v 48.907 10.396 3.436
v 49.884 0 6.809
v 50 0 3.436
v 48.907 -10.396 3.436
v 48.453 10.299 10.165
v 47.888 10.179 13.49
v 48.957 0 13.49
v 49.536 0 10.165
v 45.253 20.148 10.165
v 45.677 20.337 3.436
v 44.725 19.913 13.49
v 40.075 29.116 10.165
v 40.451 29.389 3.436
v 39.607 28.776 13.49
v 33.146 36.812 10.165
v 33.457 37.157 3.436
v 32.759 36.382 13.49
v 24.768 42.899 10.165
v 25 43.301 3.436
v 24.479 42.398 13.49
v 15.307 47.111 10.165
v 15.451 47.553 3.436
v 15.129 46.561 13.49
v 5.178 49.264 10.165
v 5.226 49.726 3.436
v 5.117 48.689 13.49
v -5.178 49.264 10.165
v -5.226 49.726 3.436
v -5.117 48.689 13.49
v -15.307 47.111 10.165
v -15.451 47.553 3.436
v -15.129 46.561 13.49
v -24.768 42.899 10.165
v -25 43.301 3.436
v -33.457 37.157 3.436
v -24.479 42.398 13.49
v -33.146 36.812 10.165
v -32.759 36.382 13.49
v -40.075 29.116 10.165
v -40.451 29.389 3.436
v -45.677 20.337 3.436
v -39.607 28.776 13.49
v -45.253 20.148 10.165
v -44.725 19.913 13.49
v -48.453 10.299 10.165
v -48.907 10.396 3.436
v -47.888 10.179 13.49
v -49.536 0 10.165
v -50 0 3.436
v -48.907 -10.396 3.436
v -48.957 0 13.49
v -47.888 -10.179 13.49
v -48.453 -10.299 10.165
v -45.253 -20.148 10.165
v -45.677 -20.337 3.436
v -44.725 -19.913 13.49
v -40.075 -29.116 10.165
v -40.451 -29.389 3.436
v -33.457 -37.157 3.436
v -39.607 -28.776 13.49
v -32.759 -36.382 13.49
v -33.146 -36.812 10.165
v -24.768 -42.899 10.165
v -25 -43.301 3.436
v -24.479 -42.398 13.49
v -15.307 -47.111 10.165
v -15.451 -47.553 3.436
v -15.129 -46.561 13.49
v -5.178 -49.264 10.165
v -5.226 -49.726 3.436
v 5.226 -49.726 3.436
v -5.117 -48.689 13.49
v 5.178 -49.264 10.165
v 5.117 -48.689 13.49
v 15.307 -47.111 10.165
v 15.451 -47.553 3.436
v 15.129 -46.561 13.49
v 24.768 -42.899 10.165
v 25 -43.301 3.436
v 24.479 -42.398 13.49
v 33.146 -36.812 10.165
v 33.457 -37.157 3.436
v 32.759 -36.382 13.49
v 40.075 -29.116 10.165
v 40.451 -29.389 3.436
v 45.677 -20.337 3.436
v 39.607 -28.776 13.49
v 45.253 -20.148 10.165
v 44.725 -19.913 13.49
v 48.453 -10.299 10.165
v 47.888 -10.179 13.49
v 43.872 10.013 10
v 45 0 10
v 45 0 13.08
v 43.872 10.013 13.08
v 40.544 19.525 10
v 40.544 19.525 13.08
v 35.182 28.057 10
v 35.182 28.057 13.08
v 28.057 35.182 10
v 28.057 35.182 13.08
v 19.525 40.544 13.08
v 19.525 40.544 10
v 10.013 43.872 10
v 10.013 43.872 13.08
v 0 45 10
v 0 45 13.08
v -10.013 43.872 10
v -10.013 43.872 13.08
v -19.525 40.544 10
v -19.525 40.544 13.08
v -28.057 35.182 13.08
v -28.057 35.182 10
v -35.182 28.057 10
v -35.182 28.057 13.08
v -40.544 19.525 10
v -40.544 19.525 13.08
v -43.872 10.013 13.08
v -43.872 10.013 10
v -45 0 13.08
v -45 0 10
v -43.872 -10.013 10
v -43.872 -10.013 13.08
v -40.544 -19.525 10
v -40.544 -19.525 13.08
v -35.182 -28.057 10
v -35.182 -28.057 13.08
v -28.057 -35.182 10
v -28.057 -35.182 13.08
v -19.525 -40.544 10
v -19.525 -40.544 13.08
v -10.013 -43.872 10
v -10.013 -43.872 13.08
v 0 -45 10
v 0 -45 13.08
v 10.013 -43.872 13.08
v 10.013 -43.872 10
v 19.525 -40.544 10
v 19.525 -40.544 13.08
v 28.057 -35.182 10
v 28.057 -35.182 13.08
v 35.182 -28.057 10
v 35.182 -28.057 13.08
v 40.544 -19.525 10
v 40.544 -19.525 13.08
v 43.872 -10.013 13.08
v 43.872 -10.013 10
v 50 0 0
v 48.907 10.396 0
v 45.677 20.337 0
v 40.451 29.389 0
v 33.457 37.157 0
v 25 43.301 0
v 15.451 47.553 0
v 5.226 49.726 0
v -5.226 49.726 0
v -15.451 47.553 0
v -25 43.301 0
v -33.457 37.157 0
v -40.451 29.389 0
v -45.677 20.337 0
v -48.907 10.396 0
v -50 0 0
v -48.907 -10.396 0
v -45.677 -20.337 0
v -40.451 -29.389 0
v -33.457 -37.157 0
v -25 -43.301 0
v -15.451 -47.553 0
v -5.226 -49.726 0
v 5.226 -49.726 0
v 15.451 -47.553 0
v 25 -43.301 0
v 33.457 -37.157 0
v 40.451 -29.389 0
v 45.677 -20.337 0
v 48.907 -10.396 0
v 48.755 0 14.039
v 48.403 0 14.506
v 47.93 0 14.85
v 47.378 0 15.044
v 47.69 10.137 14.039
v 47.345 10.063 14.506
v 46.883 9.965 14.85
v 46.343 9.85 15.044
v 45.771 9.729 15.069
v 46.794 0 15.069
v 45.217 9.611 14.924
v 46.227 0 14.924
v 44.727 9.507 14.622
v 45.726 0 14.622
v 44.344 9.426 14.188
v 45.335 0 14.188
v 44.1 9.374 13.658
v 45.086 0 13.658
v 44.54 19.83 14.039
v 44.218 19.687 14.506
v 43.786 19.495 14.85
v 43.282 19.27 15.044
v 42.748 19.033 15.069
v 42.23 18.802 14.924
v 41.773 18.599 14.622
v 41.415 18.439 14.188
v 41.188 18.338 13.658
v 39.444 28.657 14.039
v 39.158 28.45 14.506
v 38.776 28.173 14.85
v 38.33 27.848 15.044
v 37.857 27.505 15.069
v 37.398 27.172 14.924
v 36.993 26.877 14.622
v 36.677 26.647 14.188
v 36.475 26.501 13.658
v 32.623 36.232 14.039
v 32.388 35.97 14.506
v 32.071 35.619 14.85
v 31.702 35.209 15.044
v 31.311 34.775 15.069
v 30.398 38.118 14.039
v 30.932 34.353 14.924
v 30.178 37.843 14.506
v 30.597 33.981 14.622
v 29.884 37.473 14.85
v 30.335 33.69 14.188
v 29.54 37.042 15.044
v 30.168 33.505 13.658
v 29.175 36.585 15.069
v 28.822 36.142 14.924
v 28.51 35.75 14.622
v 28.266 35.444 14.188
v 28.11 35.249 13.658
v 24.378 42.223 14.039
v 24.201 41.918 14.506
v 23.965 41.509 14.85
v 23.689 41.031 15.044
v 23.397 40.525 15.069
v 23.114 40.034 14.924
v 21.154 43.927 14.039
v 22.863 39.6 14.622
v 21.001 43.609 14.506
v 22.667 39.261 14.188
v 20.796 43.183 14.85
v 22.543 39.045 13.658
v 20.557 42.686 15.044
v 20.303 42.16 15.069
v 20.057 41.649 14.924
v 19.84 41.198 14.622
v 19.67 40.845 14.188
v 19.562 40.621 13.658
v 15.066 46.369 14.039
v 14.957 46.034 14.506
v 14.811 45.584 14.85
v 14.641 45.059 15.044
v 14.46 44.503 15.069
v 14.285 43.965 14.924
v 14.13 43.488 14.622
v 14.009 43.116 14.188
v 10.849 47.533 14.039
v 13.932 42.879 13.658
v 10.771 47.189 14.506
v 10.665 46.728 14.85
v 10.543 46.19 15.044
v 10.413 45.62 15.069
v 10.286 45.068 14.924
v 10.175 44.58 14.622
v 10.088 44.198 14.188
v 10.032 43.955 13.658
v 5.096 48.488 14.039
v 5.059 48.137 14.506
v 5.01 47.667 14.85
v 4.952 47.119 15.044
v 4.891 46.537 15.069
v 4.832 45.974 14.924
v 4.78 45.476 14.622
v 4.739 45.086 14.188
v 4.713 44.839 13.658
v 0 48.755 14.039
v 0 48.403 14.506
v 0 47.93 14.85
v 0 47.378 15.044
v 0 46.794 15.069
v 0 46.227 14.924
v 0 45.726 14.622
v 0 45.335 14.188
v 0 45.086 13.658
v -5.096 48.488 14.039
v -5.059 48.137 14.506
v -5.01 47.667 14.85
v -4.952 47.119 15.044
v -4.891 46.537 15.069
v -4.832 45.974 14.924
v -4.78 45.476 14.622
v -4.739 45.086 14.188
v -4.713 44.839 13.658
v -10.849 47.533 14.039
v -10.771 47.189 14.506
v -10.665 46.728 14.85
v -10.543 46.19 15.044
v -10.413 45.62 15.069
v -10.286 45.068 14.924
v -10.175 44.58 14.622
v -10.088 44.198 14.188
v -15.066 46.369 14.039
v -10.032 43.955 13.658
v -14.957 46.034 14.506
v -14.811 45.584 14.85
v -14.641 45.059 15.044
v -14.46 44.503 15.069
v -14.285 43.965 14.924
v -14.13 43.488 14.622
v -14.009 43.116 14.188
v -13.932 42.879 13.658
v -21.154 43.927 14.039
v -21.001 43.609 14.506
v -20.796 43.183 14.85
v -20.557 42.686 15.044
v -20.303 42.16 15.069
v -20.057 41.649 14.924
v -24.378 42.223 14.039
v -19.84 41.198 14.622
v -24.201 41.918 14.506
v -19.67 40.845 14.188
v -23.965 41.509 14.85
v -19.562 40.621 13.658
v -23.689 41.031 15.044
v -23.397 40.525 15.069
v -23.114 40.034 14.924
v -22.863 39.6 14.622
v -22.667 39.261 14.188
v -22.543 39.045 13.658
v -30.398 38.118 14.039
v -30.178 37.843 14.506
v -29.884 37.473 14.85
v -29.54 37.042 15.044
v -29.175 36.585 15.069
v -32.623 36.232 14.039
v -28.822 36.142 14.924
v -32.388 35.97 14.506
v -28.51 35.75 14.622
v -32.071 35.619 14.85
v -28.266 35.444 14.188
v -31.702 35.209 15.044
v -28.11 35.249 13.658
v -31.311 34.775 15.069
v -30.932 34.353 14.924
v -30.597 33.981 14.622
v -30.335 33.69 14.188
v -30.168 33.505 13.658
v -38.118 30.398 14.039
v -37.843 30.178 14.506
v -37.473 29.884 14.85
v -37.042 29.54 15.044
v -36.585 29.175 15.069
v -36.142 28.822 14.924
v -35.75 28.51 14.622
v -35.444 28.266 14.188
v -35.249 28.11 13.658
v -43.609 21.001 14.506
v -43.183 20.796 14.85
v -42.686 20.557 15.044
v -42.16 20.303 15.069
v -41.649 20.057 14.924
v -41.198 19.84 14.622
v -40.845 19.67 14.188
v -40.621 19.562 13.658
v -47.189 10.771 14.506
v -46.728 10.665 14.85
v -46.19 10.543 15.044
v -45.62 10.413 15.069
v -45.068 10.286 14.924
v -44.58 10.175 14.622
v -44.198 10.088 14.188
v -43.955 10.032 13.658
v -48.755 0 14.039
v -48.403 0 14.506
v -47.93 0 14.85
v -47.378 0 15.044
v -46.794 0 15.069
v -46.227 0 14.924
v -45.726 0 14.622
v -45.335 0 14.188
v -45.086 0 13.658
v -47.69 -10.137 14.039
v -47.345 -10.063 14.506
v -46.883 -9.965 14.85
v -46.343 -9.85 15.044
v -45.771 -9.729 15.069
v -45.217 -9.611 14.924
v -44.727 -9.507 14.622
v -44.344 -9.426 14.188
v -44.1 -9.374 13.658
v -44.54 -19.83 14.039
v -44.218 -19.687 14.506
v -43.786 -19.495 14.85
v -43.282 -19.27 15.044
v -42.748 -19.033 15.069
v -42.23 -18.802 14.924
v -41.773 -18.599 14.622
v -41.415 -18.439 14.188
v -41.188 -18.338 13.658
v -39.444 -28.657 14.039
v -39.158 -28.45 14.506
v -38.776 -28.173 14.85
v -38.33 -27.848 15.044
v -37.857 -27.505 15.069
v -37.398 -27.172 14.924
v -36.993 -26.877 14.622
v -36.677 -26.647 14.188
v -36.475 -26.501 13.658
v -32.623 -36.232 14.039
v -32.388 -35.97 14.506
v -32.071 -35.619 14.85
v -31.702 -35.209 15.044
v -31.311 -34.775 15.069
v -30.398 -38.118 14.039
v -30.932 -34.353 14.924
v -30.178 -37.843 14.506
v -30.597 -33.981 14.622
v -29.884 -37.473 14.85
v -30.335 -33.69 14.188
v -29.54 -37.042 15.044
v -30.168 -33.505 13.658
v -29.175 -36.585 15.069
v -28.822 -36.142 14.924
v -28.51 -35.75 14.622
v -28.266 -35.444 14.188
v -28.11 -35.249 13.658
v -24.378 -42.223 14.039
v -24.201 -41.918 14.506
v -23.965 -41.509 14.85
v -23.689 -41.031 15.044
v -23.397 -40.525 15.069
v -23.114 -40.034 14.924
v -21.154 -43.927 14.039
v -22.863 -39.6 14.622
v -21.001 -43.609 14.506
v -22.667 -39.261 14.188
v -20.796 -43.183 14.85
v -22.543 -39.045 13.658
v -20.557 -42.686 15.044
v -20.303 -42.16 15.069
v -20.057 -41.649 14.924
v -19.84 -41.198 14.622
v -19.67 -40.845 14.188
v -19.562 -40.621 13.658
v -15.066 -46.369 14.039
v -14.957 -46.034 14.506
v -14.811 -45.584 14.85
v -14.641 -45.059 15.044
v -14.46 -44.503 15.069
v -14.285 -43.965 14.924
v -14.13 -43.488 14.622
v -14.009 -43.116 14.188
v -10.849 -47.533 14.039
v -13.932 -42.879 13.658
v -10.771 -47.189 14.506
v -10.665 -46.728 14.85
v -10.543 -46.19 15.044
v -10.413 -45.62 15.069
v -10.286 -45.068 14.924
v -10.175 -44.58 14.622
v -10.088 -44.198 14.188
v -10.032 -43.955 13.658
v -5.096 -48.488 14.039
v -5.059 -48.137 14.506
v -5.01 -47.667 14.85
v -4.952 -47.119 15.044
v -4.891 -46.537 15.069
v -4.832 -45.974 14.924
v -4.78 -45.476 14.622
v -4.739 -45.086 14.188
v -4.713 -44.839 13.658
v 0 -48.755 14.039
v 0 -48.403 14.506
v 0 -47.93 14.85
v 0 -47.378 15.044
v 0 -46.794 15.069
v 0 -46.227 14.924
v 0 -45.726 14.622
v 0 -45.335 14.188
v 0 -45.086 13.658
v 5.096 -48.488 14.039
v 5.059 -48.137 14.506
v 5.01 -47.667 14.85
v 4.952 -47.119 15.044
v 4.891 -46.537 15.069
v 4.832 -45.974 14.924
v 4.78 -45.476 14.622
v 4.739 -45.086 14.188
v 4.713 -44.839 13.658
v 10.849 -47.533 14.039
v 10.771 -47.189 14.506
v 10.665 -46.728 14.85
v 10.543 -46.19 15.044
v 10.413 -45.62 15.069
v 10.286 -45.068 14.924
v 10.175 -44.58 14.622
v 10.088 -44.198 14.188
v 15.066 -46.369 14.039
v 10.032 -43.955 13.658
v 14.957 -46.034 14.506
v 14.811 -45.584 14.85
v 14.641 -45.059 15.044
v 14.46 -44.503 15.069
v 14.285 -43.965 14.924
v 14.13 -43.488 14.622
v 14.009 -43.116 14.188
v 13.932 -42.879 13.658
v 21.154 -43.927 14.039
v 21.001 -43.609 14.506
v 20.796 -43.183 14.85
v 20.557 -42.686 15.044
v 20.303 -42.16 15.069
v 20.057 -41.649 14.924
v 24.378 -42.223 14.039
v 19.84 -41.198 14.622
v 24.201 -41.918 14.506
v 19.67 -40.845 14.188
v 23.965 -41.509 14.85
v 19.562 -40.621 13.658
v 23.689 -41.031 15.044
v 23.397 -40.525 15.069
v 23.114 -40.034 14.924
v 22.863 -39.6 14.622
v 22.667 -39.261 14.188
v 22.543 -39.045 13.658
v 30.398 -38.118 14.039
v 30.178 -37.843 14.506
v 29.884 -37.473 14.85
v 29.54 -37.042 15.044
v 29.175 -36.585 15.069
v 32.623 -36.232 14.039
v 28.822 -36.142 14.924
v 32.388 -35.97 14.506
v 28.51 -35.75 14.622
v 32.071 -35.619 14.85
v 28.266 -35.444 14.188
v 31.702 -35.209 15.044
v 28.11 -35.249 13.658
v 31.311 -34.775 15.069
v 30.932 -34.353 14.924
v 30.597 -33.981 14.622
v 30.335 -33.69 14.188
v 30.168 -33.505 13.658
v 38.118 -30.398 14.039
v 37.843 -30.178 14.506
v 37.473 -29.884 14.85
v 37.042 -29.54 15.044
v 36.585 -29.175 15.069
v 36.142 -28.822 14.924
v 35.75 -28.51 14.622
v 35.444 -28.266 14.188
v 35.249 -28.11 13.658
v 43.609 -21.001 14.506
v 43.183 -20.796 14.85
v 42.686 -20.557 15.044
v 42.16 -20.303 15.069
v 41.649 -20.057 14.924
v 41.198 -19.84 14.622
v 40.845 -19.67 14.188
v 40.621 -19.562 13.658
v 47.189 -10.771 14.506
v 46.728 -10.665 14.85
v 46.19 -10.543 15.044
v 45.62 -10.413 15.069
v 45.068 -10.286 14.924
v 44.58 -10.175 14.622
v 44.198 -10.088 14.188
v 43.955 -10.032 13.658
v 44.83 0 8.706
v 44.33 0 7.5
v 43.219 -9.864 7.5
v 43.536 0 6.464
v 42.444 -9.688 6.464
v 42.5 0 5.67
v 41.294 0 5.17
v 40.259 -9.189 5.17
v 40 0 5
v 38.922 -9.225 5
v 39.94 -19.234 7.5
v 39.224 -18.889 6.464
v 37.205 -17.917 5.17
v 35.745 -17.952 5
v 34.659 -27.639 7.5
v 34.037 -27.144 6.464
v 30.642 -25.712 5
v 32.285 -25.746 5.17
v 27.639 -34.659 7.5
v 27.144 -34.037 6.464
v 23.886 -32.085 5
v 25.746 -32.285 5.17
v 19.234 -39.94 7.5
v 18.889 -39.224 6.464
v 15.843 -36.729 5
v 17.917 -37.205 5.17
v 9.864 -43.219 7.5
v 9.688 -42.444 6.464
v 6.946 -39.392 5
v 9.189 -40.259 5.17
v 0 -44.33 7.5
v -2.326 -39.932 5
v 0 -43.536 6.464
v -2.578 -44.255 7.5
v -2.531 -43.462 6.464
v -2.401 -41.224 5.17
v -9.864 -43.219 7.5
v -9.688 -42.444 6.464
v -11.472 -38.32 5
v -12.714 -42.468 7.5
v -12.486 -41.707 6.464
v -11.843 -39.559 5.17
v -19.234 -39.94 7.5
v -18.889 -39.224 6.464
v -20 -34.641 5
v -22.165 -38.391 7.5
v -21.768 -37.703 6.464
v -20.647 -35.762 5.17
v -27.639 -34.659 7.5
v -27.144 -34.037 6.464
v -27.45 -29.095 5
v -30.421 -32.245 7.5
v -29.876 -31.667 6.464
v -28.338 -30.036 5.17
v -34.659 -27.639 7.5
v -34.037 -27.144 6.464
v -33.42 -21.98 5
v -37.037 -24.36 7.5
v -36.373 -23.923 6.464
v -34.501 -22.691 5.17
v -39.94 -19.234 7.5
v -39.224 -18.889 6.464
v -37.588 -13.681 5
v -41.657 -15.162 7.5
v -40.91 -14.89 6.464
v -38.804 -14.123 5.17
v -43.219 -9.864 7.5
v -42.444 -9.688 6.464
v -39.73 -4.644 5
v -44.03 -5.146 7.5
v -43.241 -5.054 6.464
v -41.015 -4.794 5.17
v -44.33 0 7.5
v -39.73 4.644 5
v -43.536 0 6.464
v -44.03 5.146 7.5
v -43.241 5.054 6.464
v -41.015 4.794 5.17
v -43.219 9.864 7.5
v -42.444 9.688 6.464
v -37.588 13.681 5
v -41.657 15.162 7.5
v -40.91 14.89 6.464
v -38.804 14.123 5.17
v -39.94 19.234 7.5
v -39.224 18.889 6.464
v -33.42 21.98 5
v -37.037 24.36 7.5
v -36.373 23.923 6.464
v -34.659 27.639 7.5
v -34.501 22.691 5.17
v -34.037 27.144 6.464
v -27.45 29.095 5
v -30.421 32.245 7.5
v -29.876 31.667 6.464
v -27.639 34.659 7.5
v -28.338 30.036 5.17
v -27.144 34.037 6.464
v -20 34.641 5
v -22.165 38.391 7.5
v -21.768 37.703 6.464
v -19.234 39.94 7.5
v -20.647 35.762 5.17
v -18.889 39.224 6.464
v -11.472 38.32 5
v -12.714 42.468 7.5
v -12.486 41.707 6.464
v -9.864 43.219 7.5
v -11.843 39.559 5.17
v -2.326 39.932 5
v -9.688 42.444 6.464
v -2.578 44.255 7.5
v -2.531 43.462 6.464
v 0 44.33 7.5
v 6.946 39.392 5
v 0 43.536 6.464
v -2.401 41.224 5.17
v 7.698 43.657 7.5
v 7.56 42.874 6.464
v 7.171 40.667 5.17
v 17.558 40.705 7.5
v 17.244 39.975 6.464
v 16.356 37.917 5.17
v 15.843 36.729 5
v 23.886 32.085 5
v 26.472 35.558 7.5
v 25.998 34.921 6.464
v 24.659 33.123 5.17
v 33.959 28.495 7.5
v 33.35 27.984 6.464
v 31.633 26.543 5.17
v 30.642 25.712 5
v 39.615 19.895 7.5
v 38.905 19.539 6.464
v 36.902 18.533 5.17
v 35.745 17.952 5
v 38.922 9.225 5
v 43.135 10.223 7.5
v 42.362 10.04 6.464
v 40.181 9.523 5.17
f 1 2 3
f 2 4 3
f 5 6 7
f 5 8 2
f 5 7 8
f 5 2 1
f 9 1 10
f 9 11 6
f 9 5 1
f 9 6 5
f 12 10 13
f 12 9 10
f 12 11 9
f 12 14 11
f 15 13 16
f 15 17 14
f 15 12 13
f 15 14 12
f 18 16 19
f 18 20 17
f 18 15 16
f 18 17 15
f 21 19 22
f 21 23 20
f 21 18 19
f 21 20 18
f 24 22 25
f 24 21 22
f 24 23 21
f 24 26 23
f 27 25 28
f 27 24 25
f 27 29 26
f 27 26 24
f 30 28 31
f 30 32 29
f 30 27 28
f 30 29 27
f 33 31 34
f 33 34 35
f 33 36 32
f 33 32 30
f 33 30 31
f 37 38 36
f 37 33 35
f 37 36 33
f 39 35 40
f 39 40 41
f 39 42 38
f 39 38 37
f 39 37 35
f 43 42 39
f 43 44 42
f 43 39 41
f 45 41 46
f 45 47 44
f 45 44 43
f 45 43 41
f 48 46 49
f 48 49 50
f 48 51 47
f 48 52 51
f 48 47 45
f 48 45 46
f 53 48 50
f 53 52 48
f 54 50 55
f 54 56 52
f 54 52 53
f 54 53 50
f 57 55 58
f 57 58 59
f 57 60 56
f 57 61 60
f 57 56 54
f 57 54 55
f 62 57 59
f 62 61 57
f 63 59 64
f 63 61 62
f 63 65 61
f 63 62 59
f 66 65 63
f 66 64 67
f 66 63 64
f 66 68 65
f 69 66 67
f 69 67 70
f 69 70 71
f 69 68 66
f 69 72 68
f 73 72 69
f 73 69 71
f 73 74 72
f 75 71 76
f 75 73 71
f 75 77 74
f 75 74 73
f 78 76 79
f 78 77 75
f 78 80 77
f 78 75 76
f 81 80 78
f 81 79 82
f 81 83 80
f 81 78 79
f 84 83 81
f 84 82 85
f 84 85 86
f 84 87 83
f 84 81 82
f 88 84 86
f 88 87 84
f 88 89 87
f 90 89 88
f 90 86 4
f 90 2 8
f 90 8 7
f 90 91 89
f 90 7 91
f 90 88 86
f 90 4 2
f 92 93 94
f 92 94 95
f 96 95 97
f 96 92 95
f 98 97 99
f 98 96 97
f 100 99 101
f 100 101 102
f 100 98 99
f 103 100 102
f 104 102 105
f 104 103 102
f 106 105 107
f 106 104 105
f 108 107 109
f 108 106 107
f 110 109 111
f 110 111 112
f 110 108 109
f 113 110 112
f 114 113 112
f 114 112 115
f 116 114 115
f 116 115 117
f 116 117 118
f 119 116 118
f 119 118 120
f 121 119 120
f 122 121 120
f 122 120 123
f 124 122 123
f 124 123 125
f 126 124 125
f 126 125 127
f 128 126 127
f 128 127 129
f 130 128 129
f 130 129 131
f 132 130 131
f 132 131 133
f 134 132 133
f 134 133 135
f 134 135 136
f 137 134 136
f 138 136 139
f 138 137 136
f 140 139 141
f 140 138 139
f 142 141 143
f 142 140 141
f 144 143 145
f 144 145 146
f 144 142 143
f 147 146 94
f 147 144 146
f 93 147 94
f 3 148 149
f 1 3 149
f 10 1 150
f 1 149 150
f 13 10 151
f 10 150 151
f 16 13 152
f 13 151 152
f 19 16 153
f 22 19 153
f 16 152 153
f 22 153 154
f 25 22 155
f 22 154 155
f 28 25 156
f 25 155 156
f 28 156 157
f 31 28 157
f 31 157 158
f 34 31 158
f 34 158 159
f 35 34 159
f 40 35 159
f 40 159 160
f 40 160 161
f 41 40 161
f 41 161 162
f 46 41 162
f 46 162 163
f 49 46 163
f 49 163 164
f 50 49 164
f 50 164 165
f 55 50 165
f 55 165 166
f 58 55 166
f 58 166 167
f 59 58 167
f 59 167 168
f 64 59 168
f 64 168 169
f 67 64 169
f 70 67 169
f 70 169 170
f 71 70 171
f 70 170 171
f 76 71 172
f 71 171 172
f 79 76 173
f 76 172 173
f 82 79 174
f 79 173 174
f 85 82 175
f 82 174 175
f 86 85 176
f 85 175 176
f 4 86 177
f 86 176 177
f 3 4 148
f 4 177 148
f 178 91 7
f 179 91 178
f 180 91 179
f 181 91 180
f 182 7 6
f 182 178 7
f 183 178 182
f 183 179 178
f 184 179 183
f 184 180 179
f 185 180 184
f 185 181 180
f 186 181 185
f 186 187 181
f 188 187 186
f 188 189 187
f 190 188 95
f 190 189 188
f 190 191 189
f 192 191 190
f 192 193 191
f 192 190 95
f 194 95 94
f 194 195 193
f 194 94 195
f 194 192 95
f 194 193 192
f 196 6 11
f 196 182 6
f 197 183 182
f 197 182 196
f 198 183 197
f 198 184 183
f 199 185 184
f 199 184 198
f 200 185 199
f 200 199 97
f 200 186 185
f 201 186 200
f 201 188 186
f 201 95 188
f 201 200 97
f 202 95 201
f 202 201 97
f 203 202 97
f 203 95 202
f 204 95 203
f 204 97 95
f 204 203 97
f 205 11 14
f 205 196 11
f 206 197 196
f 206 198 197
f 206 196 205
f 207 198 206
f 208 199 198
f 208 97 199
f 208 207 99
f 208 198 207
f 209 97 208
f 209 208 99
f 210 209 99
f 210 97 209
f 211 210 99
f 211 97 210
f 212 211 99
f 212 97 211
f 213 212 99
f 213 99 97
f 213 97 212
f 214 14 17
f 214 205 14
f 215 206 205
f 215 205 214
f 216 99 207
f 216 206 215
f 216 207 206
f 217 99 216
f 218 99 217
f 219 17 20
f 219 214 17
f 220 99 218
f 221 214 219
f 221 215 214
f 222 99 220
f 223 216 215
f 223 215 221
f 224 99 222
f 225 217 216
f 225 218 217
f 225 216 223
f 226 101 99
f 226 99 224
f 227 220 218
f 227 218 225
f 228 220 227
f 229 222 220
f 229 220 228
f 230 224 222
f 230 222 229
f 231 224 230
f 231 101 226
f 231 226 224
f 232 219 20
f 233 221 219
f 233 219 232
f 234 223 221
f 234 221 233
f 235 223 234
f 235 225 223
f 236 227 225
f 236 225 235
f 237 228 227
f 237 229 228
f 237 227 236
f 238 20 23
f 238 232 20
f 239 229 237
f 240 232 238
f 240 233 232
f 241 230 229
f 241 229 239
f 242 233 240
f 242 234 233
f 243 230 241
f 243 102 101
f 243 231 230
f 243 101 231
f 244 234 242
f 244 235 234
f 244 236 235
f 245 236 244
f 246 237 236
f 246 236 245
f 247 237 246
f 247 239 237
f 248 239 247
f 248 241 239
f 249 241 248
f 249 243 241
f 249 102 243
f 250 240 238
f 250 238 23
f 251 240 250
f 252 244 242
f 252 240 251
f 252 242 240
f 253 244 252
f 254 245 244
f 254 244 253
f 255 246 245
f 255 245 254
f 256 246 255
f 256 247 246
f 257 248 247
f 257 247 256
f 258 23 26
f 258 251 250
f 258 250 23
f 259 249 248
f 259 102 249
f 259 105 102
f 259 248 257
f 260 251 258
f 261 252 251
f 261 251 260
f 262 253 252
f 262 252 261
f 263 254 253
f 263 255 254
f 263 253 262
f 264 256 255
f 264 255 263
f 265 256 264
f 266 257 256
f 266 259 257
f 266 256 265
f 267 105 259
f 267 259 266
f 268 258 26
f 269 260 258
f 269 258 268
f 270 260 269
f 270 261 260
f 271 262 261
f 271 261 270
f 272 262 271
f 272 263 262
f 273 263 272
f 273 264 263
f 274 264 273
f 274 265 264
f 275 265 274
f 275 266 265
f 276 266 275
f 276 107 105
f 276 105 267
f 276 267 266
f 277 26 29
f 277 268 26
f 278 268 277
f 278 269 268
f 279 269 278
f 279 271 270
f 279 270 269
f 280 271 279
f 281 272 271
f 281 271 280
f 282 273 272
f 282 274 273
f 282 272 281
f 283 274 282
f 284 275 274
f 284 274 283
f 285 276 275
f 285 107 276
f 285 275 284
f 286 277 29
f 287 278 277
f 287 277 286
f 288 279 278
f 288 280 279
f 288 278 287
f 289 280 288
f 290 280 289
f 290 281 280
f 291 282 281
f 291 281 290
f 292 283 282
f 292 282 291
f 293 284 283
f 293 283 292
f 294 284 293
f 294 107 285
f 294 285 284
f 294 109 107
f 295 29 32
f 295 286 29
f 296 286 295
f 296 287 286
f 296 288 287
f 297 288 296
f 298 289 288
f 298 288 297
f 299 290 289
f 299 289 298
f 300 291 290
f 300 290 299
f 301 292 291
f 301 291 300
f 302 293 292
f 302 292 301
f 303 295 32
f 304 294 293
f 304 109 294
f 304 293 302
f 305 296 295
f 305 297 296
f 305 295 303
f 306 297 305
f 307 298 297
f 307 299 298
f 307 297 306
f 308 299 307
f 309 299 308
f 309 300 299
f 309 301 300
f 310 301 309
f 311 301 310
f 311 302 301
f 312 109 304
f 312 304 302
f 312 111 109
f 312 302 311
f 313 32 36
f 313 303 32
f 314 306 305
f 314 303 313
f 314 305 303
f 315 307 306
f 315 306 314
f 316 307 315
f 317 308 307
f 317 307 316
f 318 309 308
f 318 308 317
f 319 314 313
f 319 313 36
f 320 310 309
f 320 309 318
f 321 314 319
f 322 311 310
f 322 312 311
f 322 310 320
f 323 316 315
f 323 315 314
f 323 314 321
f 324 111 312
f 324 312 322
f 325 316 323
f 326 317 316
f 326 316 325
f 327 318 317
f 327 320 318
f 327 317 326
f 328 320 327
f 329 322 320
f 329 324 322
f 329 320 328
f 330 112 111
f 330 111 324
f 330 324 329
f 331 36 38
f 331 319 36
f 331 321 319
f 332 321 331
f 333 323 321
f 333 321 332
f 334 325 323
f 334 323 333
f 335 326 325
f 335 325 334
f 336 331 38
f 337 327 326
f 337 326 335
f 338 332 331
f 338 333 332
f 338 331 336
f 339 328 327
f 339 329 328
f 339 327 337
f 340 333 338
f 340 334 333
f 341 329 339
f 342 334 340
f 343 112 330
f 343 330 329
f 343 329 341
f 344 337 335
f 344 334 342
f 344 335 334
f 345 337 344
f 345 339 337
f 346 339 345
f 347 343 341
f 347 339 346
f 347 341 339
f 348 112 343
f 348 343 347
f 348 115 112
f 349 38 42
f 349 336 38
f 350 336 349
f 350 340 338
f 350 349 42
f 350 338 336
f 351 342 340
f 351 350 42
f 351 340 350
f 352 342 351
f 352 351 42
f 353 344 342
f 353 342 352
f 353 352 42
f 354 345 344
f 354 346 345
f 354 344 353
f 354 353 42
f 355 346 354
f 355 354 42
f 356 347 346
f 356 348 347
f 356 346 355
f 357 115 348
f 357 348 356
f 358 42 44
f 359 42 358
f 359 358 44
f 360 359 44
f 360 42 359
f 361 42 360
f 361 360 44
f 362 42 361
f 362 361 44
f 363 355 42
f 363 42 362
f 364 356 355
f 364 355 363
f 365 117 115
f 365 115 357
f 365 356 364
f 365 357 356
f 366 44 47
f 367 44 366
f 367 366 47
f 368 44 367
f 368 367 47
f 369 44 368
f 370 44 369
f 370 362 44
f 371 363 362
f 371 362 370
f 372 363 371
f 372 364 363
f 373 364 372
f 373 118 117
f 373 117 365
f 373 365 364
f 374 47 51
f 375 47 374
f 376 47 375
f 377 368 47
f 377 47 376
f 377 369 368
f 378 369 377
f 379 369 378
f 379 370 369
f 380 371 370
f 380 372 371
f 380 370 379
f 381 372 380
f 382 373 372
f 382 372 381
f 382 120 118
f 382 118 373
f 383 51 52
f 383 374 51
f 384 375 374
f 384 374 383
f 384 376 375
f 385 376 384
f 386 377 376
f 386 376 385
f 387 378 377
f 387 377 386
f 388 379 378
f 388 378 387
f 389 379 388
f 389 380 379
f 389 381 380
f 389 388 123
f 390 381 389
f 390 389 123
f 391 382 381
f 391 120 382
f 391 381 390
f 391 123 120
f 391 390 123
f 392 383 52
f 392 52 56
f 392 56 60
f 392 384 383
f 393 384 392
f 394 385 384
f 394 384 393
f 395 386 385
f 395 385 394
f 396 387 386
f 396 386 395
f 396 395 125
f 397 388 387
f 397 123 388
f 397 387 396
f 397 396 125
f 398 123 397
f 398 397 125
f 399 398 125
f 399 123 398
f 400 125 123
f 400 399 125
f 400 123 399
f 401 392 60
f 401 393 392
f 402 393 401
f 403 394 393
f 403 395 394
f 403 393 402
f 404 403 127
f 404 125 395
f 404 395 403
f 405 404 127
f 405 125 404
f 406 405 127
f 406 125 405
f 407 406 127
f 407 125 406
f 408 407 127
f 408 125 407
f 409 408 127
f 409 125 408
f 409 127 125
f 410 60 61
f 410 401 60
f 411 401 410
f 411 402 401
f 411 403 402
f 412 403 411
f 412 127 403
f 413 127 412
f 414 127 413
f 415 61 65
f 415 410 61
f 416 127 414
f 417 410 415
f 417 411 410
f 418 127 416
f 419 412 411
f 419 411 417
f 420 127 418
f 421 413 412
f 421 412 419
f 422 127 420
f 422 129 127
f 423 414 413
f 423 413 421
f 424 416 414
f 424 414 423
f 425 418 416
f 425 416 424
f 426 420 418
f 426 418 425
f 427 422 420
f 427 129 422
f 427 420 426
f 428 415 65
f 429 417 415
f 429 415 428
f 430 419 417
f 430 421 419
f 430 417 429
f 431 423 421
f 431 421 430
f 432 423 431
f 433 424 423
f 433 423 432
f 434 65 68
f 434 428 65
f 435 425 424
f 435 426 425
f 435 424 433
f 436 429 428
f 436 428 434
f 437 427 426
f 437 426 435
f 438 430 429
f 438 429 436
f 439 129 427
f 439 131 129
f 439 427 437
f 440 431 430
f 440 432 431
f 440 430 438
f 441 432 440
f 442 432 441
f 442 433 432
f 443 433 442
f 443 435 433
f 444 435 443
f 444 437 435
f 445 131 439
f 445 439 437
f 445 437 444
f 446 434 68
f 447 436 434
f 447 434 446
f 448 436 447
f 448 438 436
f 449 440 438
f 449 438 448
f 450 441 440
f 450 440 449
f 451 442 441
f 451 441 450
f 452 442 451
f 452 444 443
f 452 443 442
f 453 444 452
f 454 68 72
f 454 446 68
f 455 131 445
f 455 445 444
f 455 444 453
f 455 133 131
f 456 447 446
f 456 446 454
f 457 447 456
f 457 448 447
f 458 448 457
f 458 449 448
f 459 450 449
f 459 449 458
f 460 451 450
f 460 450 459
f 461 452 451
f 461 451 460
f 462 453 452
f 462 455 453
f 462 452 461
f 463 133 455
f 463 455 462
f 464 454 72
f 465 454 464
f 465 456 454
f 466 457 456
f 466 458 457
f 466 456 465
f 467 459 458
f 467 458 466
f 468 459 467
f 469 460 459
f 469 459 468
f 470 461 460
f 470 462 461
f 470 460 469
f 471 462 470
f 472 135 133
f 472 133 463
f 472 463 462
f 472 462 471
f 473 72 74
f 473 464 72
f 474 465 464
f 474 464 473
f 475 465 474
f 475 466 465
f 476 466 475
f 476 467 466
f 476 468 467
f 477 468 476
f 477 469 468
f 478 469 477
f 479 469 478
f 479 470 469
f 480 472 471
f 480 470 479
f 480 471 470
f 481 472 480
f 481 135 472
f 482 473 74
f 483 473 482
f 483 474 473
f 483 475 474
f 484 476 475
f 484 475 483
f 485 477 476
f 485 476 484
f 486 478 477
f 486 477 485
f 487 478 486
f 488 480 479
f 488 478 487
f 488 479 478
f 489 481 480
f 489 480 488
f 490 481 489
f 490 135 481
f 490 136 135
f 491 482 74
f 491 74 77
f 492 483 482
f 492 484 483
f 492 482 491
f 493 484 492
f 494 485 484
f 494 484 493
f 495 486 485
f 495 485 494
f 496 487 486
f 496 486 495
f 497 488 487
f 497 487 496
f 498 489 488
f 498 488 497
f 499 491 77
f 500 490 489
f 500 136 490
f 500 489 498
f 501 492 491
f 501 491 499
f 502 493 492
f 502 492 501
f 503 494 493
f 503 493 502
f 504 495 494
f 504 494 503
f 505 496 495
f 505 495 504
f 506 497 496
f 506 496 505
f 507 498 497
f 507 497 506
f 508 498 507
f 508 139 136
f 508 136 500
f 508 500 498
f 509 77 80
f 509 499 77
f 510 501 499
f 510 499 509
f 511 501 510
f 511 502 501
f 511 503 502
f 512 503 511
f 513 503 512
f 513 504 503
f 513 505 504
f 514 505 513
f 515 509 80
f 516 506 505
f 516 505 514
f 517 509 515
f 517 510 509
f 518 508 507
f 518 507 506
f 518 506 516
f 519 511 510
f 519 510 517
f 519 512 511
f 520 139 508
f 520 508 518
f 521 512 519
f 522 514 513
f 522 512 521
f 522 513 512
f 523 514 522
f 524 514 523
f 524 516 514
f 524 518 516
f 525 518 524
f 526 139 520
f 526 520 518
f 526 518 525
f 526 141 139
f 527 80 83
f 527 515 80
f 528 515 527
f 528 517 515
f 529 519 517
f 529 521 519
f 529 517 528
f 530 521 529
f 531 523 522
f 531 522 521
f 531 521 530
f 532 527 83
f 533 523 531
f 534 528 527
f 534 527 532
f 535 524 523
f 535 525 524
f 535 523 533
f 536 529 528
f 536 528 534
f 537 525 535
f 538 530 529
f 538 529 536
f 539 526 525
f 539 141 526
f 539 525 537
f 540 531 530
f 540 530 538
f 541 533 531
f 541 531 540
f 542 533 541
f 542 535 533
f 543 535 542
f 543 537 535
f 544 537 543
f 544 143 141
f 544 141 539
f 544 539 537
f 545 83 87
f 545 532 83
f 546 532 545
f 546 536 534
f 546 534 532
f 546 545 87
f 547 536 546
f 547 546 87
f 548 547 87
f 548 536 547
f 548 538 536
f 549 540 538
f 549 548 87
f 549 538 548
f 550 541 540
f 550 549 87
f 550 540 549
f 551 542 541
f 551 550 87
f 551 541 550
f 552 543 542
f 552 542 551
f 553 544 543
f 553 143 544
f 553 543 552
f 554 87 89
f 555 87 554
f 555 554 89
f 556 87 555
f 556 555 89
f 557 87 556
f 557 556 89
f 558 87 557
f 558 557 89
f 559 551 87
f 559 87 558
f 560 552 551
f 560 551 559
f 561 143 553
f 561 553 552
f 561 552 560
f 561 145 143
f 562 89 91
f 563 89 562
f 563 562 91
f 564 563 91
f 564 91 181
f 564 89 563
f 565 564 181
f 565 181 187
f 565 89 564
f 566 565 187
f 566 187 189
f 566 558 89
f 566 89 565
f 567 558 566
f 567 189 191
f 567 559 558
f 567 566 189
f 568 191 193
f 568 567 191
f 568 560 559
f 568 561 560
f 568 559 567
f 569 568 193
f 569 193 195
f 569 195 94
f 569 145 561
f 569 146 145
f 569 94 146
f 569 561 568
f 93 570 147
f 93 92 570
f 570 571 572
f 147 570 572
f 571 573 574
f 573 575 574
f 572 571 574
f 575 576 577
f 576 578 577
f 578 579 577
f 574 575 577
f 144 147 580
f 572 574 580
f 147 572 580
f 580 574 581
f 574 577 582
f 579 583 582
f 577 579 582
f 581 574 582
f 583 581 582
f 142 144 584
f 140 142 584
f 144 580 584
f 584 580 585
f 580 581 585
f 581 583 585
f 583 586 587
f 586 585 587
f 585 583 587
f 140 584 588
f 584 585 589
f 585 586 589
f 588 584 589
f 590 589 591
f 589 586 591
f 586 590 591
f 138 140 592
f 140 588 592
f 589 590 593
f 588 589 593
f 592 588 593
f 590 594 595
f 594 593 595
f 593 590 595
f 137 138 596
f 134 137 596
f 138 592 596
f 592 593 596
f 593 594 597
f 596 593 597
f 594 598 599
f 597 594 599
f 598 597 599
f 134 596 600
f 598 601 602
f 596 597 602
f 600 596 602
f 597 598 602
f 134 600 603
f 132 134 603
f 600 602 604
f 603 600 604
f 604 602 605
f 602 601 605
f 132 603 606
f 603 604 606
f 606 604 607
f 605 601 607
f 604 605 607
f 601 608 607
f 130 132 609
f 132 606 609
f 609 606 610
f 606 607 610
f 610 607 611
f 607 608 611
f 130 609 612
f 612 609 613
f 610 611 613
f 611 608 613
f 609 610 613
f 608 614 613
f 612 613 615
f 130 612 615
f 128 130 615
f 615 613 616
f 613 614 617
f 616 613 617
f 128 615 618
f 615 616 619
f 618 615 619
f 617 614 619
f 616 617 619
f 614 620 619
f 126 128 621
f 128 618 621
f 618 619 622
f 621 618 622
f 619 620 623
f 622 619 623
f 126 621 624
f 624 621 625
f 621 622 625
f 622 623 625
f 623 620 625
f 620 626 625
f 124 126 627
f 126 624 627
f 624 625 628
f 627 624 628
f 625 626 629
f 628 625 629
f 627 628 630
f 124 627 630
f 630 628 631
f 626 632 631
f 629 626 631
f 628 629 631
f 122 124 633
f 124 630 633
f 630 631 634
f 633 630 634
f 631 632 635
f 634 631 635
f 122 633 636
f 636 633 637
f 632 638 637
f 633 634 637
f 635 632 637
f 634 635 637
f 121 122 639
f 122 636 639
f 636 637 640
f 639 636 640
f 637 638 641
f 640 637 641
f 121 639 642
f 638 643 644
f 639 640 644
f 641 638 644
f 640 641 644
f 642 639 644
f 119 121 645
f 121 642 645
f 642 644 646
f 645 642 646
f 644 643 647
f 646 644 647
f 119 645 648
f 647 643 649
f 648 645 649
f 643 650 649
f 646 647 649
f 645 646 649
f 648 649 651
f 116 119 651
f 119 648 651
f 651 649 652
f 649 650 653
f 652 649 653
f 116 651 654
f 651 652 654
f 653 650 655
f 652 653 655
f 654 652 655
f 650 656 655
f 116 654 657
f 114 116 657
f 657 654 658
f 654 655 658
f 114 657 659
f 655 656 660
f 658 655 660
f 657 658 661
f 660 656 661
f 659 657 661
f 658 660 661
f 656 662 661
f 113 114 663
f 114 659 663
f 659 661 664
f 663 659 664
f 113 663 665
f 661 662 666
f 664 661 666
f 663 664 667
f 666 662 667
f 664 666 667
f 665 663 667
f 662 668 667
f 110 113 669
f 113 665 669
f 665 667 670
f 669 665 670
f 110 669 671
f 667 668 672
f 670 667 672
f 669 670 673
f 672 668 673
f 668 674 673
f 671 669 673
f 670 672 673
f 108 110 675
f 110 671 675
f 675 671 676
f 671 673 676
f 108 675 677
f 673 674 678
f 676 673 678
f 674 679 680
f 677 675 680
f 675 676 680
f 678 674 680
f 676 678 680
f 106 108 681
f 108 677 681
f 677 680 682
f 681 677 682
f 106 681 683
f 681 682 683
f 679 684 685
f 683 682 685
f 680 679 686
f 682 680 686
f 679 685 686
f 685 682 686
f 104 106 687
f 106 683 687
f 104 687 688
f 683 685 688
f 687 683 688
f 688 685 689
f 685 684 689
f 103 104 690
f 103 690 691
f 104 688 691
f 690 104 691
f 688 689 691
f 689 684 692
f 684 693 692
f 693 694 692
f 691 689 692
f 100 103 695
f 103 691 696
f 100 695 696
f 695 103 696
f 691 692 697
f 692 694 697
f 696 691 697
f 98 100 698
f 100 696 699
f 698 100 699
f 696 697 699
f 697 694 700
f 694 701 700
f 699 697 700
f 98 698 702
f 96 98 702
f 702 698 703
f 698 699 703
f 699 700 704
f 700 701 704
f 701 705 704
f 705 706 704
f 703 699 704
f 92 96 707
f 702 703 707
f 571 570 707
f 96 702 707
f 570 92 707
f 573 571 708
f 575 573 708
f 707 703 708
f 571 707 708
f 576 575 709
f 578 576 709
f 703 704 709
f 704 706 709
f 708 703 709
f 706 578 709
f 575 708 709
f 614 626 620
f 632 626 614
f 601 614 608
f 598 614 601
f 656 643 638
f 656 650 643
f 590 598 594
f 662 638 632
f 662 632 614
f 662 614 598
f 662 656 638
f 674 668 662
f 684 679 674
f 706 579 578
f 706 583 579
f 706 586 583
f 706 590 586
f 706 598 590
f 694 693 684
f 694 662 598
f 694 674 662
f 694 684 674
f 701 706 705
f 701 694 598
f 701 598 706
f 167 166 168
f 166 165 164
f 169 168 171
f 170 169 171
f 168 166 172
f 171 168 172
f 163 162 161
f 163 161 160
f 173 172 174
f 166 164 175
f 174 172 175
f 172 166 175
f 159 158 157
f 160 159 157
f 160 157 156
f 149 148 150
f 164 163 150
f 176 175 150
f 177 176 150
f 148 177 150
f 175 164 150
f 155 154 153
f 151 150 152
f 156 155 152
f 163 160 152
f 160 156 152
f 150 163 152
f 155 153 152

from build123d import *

# Parameters (mm, degrees)
F0_R     = 50
F1_DEPTH = 25
F2_T     = -5
F5_R     = 5


# Not quite as in the source:
# - a fillet or chamfer that OpenCascade refuses, or shapes differently, is made with other operations: its cross-section is extruded or revolved along the edge and cut away or added


with BuildPart() as f1:
    # F0 (on Top) → F1 (new body)
    with BuildSketch(Plane.XY):
        Circle(F0_R)
    extrude(amount=F1_DEPTH)

    # F2
    f2_openings = [f1.faces().sort_by_distance(p)[0] for p in [
        (0, 0, 25),
    ]]
    offset(amount=F2_T, openings=f2_openings)

    # F3: fillet of radius 49 on 1 edges, made by hand

    # F3_s1 → F3_t2 (revolve, cut)
    with BuildSketch(Plane.XZ):
        with BuildLine():
            ThreePointArc((50, 3.4361413472), (48.7336359395, 14.5041131577), (45, 25))
            Line((45, 25), (45.88, 25.4312771731))
            ThreePointArc((45.88, 25.4312771731), (47.5, 25.98), (50, 25.98))
            Line((50, 25.98), (50.98, 25))
            Line((50.98, 25), (50.98, 3.4361413472))
            Line((50.98, 3.4361413472), (50, 3.4361413472))
        make_face()
    revolve(axis=Axis((0, 0, 25), (0, 0, 1)), mode=Mode.SUBTRACT)

    # F4: fillet of radius 2 on 1 edges, made by hand

    # F4_s1 → F4_t2 (revolve, cut)
    with BuildSketch(Plane.XZ):
        with BuildLine():
            ThreePointArc((48.9574468085, 13.4901602258), (46.7937157507, 15.0691253656), (45, 13.0797921083))
            Line((45, 13.0797921083), (45, 25))
            ThreePointArc((45, 25), (47.3374806047, 19.3684321809), (48.9574468085, 13.4901602258))
        make_face()
    revolve(axis=Axis((0, 0, 25), (0, 0, 1)), mode=Mode.SUBTRACT)

    # F5
    f5_edges = [f1.edges().sort_by_distance(p)[0] for p in [
        (-45, 0, 5),
    ]]
    fillet(f5_edges, radius=F5_R)


solid = f1.part
